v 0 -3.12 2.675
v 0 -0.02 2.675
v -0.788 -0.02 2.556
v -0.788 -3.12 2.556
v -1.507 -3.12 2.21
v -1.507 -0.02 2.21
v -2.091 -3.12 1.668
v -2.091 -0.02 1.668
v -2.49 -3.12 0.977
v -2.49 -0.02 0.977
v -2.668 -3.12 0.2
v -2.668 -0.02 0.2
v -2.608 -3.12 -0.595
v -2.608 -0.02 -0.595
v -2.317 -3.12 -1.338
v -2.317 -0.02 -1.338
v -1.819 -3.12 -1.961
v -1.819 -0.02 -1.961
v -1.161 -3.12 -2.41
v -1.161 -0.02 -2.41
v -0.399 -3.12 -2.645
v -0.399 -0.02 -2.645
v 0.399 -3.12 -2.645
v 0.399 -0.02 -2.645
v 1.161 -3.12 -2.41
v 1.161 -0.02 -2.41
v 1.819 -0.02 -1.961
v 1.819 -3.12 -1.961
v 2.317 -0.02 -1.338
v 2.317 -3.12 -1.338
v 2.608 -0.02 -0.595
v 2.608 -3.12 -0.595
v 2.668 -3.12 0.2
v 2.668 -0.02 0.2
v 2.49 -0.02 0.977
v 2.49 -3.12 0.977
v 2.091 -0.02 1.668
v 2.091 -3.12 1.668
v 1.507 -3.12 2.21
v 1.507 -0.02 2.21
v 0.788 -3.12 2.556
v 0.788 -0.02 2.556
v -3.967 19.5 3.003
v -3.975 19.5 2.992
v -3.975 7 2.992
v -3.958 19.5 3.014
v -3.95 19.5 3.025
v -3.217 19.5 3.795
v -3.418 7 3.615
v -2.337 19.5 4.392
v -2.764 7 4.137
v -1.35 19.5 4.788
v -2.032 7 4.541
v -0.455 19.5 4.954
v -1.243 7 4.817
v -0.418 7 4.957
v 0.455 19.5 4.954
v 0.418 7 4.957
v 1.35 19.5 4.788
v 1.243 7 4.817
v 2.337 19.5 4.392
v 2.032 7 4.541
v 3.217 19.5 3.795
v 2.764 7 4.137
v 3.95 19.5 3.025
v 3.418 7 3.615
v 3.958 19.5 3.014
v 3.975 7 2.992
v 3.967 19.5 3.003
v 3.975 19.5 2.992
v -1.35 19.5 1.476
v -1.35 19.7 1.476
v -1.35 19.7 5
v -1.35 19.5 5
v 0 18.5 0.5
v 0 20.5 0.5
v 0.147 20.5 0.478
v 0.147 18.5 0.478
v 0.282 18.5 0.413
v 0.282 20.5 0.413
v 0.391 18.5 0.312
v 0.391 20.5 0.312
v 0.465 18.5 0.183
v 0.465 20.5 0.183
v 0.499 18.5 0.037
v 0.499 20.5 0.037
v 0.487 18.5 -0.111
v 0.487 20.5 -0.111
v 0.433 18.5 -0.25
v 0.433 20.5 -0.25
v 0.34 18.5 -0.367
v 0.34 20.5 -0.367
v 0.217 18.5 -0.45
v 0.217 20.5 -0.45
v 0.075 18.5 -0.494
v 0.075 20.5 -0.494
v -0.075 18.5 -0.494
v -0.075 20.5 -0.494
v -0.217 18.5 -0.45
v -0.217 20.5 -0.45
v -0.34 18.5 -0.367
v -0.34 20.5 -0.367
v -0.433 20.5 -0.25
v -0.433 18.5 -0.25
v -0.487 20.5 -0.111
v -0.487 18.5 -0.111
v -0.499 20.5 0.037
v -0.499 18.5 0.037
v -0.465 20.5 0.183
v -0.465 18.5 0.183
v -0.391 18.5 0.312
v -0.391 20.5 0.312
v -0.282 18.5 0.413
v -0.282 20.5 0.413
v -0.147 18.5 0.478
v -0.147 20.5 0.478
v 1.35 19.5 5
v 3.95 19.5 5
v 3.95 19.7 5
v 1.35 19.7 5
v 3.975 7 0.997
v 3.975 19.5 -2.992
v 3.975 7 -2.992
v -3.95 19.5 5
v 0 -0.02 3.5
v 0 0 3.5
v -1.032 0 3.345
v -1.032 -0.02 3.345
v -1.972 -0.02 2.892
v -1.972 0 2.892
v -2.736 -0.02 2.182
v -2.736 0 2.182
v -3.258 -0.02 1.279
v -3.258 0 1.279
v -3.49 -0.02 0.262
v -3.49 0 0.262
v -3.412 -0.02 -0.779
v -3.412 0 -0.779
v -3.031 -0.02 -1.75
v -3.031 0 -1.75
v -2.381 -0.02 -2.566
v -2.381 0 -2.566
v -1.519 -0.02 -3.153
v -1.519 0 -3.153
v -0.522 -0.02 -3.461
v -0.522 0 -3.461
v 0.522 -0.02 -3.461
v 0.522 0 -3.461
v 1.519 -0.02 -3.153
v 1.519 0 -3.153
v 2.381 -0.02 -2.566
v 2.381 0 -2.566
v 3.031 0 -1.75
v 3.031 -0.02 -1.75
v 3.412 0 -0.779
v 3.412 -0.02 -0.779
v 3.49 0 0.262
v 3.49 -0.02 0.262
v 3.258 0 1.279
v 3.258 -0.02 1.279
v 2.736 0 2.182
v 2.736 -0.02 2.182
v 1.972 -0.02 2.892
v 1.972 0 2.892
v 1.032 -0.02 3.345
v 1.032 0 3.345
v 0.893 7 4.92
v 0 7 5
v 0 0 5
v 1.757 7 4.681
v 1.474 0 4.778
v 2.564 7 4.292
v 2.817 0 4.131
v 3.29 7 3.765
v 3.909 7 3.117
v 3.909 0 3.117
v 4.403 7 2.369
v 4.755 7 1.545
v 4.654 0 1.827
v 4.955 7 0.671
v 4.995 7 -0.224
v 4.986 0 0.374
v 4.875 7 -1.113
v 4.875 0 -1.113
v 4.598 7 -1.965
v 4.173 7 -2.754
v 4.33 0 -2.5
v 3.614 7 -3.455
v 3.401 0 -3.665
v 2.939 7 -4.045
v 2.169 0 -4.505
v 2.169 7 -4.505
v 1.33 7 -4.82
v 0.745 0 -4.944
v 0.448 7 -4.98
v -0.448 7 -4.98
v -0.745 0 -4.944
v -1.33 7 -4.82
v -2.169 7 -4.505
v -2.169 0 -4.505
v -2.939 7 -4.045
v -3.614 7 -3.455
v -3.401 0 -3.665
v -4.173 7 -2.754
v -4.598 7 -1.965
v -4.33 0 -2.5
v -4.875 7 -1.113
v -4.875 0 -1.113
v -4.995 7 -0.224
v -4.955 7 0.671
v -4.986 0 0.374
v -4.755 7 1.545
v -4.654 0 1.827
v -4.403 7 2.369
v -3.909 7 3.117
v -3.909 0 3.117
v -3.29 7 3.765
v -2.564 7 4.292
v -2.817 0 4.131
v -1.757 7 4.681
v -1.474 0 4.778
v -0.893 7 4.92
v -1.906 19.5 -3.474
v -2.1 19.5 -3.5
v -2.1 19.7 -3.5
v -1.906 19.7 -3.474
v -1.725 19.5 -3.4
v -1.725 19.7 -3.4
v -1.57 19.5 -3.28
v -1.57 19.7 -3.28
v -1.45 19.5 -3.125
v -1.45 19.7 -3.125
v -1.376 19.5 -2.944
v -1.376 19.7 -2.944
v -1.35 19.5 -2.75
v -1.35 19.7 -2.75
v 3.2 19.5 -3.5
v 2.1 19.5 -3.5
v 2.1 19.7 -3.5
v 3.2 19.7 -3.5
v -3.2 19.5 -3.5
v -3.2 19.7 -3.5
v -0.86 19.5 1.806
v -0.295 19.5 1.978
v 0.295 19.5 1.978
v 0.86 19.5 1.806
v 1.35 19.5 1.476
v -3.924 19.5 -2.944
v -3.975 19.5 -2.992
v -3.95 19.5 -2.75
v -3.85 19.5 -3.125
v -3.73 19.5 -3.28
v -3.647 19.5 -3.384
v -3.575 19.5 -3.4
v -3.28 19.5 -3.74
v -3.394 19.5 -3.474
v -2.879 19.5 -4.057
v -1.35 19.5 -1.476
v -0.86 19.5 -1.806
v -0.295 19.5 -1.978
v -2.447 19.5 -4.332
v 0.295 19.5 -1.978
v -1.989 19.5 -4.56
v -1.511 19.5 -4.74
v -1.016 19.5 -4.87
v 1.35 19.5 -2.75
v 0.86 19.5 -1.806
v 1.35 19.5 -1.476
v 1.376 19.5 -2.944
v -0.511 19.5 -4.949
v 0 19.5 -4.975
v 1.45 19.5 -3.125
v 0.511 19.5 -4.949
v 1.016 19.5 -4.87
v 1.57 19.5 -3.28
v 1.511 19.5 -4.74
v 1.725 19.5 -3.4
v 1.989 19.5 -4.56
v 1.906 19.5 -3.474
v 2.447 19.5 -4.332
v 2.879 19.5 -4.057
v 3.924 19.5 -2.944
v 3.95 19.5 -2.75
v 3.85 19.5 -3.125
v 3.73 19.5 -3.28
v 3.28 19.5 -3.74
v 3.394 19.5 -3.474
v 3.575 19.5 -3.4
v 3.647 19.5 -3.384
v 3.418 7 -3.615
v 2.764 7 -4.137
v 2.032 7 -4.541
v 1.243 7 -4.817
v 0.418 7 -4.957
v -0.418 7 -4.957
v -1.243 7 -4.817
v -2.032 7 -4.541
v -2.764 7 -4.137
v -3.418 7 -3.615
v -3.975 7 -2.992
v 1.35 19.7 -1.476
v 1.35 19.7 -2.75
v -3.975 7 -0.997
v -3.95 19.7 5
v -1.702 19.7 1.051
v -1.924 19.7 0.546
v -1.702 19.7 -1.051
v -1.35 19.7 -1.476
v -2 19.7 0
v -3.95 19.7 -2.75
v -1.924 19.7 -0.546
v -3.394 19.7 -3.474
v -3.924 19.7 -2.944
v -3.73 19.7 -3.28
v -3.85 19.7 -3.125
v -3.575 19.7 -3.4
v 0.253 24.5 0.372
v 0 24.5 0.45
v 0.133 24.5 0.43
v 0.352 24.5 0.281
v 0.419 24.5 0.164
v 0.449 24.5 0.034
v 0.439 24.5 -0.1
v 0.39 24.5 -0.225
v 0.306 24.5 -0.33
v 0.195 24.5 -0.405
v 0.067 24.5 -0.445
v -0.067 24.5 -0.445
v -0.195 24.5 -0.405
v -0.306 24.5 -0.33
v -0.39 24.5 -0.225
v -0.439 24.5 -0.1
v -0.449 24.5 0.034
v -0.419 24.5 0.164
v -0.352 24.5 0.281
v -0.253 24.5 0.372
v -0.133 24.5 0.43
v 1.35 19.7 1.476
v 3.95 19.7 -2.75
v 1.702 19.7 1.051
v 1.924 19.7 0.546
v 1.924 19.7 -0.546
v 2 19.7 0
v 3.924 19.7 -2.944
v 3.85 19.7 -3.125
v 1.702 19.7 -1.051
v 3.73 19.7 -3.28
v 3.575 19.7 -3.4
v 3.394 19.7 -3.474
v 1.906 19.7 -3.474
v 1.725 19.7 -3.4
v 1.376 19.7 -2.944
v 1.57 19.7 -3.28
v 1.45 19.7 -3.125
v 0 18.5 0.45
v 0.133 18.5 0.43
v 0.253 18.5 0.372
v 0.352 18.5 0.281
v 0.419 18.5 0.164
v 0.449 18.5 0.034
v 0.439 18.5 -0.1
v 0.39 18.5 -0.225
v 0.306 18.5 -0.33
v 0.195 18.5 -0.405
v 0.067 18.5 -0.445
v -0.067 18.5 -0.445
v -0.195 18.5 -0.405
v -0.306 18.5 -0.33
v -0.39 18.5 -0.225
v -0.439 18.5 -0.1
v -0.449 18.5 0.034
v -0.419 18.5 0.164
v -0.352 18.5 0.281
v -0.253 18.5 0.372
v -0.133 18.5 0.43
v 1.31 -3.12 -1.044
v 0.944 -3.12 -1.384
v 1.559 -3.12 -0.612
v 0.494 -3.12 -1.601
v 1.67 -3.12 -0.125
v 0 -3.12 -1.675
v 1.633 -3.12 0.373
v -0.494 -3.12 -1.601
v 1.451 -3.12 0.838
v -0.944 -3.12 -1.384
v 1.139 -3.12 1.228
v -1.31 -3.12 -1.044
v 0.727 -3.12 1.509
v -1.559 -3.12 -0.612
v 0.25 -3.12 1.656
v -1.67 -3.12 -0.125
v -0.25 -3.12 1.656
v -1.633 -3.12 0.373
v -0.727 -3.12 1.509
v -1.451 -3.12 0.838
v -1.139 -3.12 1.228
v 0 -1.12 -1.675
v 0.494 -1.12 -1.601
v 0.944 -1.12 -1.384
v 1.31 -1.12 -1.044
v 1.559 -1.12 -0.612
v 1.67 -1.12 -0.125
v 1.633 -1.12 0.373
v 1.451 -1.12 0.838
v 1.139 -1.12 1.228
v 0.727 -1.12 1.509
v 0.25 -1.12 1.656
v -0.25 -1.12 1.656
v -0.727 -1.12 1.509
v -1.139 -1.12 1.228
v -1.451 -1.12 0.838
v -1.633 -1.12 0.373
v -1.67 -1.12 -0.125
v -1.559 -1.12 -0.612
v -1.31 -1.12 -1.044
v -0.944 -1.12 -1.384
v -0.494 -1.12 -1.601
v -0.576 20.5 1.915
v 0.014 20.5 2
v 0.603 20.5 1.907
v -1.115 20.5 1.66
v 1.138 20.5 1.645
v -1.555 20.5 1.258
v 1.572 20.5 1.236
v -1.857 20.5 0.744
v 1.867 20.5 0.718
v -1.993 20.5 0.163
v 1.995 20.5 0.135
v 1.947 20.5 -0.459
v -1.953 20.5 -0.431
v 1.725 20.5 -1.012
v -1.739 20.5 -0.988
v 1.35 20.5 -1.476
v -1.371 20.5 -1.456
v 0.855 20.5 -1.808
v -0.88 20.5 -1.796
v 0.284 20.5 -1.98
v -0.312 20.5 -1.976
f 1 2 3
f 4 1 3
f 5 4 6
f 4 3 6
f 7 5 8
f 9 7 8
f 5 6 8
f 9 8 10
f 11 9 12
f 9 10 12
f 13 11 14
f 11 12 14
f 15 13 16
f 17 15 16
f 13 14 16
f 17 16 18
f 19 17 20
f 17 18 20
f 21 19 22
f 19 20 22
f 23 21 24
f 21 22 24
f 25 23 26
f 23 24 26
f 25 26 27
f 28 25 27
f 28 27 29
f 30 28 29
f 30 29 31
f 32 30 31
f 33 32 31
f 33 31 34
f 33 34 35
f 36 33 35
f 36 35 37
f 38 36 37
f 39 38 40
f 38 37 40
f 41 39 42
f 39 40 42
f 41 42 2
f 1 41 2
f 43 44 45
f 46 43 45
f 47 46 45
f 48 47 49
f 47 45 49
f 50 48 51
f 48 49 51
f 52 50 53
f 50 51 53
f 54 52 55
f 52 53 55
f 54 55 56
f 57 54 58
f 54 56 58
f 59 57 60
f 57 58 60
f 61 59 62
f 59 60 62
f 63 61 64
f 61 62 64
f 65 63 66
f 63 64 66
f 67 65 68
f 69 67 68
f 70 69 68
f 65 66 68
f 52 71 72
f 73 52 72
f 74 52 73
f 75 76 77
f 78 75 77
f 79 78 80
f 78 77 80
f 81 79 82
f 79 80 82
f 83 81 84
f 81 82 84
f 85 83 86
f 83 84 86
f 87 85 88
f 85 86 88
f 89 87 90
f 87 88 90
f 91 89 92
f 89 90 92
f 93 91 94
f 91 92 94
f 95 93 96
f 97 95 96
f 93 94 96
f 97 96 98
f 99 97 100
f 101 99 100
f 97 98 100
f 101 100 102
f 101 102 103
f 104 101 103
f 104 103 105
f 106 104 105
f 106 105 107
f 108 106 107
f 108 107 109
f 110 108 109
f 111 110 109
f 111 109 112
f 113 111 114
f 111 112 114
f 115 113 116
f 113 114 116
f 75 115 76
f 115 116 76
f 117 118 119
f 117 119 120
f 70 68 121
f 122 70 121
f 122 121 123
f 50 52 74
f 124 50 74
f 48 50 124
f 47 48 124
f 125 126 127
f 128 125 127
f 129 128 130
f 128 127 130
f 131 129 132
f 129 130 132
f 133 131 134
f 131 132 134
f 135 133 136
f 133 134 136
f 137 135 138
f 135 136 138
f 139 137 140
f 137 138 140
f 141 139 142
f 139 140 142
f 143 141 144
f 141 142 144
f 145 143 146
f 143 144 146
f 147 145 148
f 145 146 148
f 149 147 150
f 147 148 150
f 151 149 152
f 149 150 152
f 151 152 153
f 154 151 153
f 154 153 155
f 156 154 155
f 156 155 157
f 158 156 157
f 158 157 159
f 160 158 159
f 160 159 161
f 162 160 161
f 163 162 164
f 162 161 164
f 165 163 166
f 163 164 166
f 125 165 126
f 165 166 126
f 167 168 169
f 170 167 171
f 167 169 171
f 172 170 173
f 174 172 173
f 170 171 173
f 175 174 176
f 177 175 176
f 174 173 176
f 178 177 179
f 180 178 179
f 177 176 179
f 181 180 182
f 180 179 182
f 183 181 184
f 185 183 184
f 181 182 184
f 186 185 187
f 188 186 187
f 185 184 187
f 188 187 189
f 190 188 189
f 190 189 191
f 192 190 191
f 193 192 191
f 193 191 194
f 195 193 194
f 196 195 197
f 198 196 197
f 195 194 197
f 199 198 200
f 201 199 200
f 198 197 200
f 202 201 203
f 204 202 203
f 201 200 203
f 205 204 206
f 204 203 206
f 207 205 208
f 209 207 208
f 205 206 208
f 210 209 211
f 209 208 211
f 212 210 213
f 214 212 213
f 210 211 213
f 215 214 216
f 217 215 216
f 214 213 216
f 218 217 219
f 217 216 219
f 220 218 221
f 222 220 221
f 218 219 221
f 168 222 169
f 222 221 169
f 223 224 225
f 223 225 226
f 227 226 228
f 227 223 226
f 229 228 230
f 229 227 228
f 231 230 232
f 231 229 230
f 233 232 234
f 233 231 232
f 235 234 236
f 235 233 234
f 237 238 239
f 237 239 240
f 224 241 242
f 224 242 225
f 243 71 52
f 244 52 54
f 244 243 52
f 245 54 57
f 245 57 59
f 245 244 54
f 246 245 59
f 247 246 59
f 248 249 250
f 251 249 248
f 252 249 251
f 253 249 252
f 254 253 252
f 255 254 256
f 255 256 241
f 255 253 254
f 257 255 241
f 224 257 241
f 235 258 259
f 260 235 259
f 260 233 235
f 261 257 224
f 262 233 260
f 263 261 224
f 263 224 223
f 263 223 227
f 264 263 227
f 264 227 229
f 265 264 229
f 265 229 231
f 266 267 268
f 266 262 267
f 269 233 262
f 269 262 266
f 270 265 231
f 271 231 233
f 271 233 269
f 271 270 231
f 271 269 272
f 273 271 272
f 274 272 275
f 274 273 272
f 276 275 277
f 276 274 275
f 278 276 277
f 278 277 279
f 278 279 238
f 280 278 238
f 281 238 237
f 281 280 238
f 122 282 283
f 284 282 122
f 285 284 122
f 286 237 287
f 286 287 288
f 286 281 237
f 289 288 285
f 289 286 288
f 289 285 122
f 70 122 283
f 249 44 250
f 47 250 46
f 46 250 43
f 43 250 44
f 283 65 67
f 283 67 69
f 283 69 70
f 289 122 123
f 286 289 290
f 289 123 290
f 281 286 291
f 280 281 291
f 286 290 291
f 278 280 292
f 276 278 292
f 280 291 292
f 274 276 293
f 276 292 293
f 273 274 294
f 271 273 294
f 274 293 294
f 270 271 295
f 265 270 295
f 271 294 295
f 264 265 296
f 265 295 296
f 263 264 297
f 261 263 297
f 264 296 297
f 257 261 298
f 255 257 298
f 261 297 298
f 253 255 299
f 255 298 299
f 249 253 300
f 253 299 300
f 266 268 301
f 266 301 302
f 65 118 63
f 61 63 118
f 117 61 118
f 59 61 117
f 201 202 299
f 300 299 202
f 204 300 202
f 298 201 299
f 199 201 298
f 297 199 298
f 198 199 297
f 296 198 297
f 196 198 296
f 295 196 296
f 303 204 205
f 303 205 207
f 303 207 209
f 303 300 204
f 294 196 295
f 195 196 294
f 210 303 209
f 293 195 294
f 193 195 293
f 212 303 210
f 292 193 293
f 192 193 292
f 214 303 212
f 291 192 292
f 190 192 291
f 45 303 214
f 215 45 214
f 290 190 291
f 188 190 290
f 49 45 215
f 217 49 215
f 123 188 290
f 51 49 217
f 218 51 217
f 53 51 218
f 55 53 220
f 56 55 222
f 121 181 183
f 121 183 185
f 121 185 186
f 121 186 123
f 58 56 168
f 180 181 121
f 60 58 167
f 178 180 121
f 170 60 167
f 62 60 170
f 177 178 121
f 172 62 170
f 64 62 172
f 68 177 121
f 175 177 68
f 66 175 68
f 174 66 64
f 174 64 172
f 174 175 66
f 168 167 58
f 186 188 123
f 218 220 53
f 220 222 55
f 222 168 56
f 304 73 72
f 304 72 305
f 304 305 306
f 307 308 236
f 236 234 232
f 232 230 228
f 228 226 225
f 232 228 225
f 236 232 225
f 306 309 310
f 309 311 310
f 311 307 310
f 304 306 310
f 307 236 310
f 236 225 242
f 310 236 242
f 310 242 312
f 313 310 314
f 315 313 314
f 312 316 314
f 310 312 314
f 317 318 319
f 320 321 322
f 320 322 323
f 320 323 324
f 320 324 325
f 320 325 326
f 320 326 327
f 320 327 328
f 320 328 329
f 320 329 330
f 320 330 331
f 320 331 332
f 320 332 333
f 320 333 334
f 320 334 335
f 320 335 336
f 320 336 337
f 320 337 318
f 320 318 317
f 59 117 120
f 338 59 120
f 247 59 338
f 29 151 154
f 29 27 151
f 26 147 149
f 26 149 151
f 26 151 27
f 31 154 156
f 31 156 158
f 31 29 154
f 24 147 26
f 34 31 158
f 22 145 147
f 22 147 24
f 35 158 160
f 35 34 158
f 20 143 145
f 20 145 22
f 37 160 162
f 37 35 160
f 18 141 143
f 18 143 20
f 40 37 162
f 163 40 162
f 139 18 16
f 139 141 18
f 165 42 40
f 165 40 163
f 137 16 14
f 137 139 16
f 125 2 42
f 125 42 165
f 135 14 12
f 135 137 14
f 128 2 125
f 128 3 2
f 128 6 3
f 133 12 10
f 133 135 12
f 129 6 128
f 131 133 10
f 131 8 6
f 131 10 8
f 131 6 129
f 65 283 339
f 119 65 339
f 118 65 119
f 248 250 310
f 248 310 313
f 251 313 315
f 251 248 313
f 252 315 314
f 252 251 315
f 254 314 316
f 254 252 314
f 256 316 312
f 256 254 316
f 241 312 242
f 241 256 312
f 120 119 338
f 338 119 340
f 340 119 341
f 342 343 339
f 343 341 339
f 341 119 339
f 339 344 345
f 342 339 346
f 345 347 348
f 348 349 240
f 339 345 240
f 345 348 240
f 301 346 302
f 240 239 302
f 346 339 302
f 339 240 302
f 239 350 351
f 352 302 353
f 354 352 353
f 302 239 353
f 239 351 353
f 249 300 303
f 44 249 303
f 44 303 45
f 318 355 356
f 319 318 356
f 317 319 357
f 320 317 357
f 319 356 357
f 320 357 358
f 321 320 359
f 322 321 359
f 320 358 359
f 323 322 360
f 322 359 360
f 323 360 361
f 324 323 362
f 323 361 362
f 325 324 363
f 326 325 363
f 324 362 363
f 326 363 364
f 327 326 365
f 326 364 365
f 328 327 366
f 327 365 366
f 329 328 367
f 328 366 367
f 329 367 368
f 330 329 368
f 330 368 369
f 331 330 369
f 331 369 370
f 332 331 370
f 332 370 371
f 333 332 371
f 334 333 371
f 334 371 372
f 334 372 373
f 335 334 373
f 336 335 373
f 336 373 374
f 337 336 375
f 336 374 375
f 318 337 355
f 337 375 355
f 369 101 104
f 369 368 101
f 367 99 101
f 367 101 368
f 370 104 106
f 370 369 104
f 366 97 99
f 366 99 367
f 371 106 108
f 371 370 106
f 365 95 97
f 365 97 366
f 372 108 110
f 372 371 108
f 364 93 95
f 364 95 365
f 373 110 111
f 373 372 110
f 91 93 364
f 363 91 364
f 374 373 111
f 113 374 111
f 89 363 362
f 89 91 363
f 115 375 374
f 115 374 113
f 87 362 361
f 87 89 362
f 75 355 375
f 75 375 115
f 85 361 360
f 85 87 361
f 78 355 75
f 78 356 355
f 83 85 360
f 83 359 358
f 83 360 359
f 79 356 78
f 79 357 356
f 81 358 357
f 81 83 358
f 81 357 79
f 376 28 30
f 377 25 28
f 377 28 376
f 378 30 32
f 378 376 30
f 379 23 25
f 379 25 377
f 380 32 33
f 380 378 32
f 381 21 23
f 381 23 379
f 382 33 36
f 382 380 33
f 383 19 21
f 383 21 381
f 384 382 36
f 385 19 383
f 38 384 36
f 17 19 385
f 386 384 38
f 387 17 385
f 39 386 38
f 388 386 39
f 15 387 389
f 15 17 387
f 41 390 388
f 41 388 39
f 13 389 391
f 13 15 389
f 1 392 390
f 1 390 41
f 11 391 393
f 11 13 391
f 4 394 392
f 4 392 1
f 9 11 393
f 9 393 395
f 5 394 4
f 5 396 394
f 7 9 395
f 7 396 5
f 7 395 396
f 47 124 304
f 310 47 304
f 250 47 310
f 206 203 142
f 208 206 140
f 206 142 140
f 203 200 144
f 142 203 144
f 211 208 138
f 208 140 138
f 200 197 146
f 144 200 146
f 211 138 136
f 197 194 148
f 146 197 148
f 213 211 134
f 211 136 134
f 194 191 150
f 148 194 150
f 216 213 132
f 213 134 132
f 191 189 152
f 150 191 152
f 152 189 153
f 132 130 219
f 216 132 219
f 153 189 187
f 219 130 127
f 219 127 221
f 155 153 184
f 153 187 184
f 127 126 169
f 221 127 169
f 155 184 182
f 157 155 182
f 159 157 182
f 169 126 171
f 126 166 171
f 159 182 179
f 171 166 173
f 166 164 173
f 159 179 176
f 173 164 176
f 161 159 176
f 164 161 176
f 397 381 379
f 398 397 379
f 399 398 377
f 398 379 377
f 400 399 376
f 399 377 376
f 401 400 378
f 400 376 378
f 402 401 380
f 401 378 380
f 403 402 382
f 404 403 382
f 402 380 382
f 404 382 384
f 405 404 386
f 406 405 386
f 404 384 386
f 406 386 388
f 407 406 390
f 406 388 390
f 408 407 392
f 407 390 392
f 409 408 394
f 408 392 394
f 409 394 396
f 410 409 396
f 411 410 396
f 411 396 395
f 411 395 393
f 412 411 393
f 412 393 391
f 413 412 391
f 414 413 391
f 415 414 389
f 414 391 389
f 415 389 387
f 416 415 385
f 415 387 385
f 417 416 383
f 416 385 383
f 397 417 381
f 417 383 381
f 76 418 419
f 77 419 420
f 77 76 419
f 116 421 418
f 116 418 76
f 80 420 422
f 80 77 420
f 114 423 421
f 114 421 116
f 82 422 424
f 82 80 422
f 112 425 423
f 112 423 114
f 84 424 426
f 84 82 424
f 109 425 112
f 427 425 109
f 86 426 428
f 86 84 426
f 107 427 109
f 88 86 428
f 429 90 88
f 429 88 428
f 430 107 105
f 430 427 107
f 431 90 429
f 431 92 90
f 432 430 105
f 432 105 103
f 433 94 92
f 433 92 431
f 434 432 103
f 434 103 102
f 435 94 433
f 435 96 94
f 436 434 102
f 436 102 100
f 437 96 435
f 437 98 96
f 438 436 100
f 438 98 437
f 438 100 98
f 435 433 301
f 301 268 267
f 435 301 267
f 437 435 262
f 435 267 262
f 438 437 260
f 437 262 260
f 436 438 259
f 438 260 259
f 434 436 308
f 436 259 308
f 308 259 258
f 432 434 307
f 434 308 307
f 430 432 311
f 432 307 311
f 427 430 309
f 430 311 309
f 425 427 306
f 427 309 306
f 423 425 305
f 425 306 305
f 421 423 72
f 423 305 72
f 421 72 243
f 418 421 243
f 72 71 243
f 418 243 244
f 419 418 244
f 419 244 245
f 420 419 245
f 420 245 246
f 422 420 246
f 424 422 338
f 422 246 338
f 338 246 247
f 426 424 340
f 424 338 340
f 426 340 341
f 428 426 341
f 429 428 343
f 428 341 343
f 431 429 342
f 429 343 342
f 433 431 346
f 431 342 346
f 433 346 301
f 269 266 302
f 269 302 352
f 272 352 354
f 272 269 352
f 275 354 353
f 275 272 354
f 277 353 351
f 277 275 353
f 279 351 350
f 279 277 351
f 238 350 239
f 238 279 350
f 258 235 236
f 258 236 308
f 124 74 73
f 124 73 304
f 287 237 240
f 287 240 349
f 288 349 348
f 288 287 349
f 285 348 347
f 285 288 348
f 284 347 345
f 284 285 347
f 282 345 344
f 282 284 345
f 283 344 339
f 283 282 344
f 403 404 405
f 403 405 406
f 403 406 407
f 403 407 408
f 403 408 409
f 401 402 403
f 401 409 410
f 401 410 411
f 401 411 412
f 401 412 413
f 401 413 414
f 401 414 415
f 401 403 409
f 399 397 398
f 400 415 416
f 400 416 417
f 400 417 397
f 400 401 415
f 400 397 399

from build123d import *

# Parameters (mm, degrees)
SKETCH2_R           = 5
BOSS_EXTRUDE1_DEPTH = 7
BOSS_EXTRUDE2_DEPTH = 12.5
BOSS_EXTRUDE3_DEPTH = 0.2
SKETCH5_R           = 2
BOSS_EXTRUDE4_DEPTH = 1
SKETCH6_R           = 0.5
CUT_EXTRUDE1_DEPTH  = 2
SKETCH7_R           = 0.45
BOSS_EXTRUDE5_DEPTH = 6
SKETCH8_R           = 3.5
BOSS_EXTRUDE6_DEPTH = 0.02
SKETCH9_R           = 2.675
BOSS_EXTRUDE7_DEPTH = 3.1
SKETCH10_R          = 1.675
CUT_EXTRUDE2_DEPTH  = 2


with BuildPart() as part:
    # Sketch2 → Boss-Extrude1 (new body)
    with BuildSketch(Plane(origin=(0, 0, 0), x_dir=(1, 0, 0), z_dir=(0, 1, 0))):
        with Locations(Location((0, 0, 0), (0, 0, 270))):
            Circle(SKETCH2_R)
    extrude(amount=BOSS_EXTRUDE1_DEPTH)

    # Sketch3 → Boss-Extrude2 (add)
    with BuildSketch(Plane(origin=(0, 7, 0), x_dir=(1, 0, 0), z_dir=(0, 1, 0))):
        with BuildLine():
            Line((-3.975, 2.99165506), (-3.975, -2.99165506))
            ThreePointArc((-3.975, -2.99165506), (0, -4.975), (3.975, -2.99165506))
            Line((3.975, -2.99165506), (3.975, 2.99165506))
            ThreePointArc((3.975, 2.99165506), (0, 4.975), (-3.975, 2.99165506))
        make_face()
    extrude(amount=BOSS_EXTRUDE2_DEPTH)

    # Sketch4 → Boss-Extrude3 (add)
    with BuildSketch(Plane(origin=(0, 19.5, 0), x_dir=(1, 0, 0), z_dir=(0, 1, 0))):
        with BuildLine():
            Line((-3.2, 3.5), (-2.1, 3.5))
            ThreePointArc((-2.1, 3.5), (-1.569669914, 3.280330086), (-1.35, 2.75))
            Line((-1.35, 2.75), (-1.35, -5))
            Line((-1.35, -5), (-3.95, -5))
            Line((-3.95, -5), (-3.95, 2.75))
            ThreePointArc((-3.95, 2.75), (-3.730330086, 3.280330086), (-3.2, 3.5))
        make_face()
        with BuildLine():
            Line((3.95, -5), (1.35, -5))
            Line((1.35, -5), (1.35, 2.75))
            ThreePointArc((1.35, 2.75), (1.569669914, 3.280330086), (2.1, 3.5))
            Line((2.1, 3.5), (3.2, 3.5))
            ThreePointArc((3.2, 3.5), (3.730330086, 3.280330086), (3.95, 2.75))
            Line((3.95, 2.75), (3.95, -5))
        make_face()
    extrude(amount=BOSS_EXTRUDE3_DEPTH)

    # Sketch5 → Boss-Extrude4 (add)
    with BuildSketch(Plane(origin=(0, 19.5, 0), x_dir=(1, 0, 0), z_dir=(0, 1, 0))):
        with Locations(Location((0, 0, 0), (0, 0, 47.545849796))):
            Circle(SKETCH5_R)
    extrude(amount=BOSS_EXTRUDE4_DEPTH)

    # Sketch6 → Cut-Extrude1 (cut)
    with BuildSketch(Plane(origin=(0, 20.5, 0), x_dir=(1, 0, 0), z_dir=(0, 1, 0))):
        with Locations(Location((0, 0, 0), (0, 0, 270))):
            Circle(SKETCH6_R)
    extrude(amount=-CUT_EXTRUDE1_DEPTH, mode=Mode.SUBTRACT)

    # Sketch7 → Boss-Extrude5 (add)
    with BuildSketch(Plane(origin=(0, 18.5, 0), x_dir=(1, 0, 0), z_dir=(0, 1, 0))):
        with Locations(Location((0, 0, 0), (0, 0, 270))):
            Circle(SKETCH7_R)
    extrude(amount=BOSS_EXTRUDE5_DEPTH)

    # Sketch8 → Boss-Extrude6 (add)
    with BuildSketch(Plane.XZ):
        with Locations(Location((0, 0, 0), (0, 0, 90))):
            Circle(SKETCH8_R)
    extrude(amount=BOSS_EXTRUDE6_DEPTH)

    # Sketch9 → Boss-Extrude7 (add)
    with BuildSketch(Plane.XZ.offset(0.02)):
        with Locations(Location((0, 0, 0), (0, 0, 90))):
            Circle(SKETCH9_R)
    extrude(amount=BOSS_EXTRUDE7_DEPTH)

    # Sketch10 → Cut-Extrude2 (cut)
    with BuildSketch(Plane.XZ.offset(3.12)):
        with Locations(Location((0, 0, 0), (0, 0, 270))):
            Circle(SKETCH10_R)
    extrude(amount=-CUT_EXTRUDE2_DEPTH, mode=Mode.SUBTRACT)


solid = part.part
